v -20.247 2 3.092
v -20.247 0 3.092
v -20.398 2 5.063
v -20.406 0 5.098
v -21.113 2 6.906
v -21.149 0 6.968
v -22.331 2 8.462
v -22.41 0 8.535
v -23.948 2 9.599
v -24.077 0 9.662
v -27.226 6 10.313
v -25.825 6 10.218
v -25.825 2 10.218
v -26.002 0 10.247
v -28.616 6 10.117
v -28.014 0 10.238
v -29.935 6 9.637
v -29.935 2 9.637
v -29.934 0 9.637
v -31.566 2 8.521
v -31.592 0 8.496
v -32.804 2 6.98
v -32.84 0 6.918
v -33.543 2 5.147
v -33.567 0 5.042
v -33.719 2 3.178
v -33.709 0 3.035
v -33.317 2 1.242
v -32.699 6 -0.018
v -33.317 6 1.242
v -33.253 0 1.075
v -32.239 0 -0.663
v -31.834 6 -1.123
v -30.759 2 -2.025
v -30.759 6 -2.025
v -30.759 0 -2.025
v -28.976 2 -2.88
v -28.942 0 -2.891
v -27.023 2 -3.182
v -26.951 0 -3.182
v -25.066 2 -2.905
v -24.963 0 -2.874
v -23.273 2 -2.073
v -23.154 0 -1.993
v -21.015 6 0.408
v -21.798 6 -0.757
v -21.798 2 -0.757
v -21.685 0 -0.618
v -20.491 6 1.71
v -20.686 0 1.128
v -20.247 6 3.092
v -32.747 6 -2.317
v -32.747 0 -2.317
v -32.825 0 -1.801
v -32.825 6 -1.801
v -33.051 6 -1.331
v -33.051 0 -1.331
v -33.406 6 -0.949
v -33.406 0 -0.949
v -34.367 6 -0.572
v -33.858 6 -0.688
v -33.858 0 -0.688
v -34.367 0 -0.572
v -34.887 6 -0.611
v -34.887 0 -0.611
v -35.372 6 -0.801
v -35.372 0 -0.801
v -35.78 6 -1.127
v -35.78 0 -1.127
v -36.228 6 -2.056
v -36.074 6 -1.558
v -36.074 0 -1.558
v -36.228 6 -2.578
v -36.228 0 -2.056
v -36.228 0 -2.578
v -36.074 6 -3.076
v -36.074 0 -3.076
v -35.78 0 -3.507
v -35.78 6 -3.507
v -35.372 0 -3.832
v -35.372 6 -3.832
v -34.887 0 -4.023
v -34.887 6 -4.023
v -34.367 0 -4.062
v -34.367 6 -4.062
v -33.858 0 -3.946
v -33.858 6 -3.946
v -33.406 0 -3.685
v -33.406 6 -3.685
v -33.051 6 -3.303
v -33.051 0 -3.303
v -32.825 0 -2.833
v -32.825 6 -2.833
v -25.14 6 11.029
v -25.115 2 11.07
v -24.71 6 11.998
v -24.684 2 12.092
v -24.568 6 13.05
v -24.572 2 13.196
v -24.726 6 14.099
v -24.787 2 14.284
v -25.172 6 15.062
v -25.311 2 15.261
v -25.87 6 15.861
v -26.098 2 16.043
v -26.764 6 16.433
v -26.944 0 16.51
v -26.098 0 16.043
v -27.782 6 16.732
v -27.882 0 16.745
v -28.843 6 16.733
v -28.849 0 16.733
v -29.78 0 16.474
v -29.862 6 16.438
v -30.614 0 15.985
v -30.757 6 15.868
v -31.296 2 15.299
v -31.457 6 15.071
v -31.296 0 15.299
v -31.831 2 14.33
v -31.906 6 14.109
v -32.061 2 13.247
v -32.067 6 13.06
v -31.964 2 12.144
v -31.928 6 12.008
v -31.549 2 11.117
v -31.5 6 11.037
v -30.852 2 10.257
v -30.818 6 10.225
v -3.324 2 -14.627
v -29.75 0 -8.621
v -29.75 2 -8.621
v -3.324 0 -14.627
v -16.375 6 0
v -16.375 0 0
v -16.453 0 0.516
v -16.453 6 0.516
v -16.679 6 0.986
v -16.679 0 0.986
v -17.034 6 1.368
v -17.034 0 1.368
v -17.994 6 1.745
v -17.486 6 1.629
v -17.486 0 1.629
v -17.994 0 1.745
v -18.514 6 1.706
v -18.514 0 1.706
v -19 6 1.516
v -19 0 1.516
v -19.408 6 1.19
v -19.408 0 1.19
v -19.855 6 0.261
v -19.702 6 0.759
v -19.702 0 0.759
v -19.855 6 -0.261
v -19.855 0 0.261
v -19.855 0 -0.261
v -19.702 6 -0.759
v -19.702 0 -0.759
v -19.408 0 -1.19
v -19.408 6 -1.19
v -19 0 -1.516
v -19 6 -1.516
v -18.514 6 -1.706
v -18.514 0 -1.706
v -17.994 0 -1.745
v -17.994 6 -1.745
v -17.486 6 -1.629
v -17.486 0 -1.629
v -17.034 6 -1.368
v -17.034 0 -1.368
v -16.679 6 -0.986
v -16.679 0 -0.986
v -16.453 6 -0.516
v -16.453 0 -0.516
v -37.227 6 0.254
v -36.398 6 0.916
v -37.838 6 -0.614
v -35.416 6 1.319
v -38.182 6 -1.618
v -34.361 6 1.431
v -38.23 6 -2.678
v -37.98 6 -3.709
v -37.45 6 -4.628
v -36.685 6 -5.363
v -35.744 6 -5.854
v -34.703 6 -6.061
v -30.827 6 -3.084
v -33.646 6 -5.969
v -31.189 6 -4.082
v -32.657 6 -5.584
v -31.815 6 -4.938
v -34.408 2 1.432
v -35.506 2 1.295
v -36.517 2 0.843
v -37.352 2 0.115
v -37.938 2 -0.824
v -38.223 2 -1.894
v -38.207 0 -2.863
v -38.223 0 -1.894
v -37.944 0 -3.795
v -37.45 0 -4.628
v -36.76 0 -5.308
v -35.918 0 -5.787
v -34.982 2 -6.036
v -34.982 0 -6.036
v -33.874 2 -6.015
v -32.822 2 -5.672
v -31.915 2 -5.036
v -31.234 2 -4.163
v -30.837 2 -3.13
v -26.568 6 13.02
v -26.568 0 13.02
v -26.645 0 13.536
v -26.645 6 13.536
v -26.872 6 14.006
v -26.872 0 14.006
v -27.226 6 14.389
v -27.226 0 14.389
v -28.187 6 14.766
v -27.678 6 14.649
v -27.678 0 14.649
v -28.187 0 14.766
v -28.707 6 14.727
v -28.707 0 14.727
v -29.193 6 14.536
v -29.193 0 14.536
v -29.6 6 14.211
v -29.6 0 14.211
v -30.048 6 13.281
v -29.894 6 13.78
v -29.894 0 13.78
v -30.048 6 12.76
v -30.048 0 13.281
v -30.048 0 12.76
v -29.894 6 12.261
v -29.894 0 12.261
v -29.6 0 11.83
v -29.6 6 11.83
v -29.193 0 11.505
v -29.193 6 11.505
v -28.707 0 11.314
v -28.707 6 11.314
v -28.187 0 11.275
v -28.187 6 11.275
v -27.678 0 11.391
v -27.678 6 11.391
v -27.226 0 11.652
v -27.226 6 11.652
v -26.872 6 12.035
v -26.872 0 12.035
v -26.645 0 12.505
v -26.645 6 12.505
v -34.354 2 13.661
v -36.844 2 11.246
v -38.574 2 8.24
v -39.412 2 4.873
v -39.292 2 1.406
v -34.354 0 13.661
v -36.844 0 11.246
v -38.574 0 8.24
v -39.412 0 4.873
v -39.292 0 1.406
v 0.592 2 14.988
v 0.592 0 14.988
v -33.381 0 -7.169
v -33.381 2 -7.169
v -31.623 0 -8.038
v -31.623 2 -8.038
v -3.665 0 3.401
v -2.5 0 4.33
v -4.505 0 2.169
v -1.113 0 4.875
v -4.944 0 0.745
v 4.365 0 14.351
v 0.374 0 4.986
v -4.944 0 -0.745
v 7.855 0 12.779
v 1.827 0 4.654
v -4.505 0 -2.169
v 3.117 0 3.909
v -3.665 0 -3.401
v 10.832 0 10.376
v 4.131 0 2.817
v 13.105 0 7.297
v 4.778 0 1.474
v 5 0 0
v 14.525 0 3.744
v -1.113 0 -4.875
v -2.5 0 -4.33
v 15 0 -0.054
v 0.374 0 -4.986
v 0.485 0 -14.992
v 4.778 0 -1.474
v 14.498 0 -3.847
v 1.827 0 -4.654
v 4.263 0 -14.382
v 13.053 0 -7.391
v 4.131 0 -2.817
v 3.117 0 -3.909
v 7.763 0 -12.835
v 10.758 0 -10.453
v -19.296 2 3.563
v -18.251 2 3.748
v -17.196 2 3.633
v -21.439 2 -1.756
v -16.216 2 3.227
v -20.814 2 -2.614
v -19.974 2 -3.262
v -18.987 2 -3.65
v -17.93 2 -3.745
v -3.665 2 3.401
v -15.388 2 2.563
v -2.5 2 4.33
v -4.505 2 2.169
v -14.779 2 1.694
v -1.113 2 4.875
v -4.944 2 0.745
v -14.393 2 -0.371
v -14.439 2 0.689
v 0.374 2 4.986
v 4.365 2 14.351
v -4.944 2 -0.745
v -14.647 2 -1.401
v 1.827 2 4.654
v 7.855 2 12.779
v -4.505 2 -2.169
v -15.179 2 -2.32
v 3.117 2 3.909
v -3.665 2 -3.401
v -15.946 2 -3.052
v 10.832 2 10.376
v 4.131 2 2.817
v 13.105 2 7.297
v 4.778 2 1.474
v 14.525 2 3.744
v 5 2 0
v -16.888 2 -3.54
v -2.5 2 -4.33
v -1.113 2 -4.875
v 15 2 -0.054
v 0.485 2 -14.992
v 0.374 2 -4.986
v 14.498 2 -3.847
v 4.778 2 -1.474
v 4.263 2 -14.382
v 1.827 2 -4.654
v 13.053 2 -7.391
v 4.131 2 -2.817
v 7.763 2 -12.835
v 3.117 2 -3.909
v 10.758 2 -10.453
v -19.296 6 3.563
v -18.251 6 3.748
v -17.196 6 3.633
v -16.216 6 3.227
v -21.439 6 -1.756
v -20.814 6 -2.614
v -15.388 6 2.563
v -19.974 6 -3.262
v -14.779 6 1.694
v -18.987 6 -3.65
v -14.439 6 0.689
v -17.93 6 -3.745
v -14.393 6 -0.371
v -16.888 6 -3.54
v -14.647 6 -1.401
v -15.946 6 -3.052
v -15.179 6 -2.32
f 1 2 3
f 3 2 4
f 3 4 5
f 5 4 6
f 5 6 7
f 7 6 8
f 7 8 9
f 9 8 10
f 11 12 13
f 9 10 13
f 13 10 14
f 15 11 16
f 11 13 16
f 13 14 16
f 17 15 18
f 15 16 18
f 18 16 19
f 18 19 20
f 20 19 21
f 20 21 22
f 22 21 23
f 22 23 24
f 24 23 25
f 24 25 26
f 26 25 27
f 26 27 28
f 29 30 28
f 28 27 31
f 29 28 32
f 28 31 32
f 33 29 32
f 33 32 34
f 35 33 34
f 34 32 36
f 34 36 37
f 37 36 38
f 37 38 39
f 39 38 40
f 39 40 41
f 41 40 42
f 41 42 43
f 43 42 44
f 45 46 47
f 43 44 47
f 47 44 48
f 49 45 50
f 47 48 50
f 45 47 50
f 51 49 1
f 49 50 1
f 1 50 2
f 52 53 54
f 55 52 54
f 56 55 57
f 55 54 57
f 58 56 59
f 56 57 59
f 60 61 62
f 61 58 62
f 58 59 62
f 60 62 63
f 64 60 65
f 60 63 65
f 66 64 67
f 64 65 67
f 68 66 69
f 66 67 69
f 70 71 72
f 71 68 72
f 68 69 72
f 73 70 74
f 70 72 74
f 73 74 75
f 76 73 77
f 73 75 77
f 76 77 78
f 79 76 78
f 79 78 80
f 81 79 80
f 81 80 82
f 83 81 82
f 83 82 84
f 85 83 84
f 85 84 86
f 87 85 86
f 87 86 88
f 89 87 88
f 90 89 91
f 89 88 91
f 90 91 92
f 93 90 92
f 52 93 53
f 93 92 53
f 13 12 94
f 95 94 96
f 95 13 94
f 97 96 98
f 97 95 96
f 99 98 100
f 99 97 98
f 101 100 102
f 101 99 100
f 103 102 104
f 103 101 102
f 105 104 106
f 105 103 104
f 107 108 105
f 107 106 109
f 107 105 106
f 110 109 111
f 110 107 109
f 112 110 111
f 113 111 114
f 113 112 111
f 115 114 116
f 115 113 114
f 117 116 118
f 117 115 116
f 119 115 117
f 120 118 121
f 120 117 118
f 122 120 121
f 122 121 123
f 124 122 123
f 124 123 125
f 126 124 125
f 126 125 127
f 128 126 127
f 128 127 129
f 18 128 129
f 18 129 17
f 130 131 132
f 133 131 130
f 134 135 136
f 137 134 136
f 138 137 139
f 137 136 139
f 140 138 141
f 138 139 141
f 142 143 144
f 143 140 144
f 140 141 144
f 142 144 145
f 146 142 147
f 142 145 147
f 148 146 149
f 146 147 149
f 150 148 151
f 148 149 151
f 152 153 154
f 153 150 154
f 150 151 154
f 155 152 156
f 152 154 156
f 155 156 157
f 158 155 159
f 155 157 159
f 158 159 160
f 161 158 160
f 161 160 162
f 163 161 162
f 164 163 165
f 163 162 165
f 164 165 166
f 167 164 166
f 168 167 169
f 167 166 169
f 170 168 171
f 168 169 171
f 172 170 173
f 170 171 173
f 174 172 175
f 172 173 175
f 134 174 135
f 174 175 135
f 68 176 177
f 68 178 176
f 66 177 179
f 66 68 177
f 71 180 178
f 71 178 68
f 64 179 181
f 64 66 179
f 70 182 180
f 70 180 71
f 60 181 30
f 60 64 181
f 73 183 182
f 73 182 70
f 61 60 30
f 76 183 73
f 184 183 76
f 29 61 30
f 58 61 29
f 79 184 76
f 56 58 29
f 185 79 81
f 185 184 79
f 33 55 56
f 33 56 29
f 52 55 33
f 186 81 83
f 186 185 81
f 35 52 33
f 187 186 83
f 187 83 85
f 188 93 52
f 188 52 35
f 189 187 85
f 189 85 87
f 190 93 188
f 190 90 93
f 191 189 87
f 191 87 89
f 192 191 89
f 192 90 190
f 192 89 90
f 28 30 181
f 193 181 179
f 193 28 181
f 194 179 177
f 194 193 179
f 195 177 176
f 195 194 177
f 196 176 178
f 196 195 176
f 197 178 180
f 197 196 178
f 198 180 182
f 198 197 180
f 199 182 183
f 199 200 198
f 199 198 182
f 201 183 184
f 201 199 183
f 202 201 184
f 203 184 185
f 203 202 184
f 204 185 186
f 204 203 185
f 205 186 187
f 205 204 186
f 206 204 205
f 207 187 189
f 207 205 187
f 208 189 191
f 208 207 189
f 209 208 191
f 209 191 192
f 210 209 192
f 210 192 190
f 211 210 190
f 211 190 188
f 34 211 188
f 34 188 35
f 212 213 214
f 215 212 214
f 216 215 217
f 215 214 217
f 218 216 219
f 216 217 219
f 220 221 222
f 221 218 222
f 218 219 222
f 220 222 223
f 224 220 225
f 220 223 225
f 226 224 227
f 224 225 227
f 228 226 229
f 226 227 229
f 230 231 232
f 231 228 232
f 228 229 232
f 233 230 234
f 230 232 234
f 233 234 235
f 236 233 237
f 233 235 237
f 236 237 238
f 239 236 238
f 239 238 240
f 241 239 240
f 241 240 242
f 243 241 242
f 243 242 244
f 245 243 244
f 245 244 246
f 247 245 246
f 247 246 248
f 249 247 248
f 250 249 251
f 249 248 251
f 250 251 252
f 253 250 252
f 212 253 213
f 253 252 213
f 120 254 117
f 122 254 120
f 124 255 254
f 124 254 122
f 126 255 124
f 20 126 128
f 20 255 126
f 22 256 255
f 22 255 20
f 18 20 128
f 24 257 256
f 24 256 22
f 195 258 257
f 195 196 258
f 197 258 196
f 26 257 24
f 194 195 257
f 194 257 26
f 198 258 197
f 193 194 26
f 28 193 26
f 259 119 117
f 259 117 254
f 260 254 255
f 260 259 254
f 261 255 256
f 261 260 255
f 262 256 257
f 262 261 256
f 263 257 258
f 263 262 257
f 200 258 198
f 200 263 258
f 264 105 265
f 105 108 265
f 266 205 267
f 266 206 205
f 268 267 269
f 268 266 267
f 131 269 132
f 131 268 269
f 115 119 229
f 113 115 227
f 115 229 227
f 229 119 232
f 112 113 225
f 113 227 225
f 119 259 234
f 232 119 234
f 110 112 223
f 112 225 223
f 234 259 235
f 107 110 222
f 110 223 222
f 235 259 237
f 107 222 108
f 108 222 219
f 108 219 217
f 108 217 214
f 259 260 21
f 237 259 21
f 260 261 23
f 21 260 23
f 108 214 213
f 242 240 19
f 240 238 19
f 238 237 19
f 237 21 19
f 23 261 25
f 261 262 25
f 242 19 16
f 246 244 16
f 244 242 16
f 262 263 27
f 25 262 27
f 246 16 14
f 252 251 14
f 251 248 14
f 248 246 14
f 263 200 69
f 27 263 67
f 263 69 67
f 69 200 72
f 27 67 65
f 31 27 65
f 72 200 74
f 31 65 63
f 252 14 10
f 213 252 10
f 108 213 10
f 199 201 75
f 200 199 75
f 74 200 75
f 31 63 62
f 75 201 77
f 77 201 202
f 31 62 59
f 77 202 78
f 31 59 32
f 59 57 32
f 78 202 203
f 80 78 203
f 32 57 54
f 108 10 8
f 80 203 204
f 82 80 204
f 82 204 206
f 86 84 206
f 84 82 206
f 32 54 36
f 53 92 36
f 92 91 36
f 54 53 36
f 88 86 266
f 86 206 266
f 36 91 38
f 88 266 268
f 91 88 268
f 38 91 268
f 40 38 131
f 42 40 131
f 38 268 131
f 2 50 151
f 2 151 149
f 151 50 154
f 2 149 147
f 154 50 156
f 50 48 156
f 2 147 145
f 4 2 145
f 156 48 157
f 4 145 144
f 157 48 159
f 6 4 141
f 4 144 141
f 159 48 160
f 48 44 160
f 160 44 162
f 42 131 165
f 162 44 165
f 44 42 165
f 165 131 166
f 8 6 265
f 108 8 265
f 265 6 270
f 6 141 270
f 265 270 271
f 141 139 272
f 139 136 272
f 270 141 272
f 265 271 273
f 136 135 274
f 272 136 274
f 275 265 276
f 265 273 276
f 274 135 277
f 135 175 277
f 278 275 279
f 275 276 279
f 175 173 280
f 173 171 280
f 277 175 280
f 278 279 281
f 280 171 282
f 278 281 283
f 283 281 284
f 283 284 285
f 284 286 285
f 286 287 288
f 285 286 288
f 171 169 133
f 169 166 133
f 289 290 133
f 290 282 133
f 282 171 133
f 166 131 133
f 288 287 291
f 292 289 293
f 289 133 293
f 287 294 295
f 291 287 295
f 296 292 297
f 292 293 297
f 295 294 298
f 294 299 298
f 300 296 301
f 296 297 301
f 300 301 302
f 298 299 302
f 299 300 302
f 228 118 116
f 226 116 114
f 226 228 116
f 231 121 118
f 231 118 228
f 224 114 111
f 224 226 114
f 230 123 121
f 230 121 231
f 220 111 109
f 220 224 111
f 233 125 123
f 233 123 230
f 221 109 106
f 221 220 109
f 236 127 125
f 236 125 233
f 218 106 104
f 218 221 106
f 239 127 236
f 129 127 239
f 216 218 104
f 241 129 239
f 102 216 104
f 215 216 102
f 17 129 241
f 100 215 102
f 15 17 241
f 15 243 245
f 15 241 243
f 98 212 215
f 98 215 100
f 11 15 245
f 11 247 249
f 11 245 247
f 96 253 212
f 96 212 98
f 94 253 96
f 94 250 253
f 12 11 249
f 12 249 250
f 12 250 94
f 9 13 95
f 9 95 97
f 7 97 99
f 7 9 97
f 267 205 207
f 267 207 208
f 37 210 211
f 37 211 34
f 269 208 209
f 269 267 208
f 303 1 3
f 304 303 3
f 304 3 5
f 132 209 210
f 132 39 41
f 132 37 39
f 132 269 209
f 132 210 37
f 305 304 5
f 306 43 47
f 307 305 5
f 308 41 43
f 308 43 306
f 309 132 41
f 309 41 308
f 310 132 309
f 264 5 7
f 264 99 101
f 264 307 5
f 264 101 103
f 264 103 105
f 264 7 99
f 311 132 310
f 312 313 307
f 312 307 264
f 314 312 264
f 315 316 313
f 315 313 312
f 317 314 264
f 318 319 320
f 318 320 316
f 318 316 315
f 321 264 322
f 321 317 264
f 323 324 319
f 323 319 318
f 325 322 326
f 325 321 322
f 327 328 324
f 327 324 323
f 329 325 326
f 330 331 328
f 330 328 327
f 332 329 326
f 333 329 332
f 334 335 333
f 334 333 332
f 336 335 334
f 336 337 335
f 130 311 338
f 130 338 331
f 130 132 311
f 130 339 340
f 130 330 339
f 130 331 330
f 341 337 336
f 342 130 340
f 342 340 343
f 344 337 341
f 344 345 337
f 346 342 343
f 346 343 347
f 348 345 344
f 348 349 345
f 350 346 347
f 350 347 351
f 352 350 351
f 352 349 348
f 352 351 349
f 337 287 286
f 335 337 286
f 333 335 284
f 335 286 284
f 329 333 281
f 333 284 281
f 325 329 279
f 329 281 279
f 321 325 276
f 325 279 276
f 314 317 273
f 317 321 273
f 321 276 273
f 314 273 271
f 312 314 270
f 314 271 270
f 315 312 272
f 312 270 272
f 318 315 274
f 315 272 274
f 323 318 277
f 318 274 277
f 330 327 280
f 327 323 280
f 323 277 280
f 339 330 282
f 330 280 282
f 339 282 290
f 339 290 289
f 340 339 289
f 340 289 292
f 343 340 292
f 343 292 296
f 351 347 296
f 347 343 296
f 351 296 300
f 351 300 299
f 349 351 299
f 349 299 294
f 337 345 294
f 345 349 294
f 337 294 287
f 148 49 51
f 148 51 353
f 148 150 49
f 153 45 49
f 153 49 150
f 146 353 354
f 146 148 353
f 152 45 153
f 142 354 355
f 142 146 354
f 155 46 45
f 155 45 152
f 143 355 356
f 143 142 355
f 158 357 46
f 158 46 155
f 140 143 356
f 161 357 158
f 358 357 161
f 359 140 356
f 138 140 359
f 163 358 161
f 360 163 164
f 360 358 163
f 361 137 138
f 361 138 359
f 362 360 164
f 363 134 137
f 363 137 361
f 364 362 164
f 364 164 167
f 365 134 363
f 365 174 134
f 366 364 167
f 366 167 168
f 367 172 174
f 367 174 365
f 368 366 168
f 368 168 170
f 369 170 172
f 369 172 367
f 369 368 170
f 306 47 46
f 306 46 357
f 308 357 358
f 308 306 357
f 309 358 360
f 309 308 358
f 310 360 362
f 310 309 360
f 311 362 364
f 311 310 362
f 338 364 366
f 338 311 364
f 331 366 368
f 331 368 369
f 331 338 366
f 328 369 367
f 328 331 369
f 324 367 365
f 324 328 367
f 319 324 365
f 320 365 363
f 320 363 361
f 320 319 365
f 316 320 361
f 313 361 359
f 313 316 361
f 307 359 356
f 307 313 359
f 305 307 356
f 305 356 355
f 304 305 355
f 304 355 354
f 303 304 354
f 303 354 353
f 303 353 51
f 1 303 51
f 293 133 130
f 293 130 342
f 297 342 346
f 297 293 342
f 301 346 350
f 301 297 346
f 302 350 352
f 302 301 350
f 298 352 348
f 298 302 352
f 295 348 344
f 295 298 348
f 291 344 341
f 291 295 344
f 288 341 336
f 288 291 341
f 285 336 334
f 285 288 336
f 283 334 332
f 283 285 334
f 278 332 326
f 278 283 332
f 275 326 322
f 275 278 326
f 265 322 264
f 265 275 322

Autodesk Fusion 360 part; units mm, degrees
sketch "Sketch1" plane through (0, 0, 0) normal (0, 1, 0) x (1, 0, 0)
  circle A0 centre (0, 0) radius 15
  circle A1 centre (0, 0) radius 5
  circle A2 centre (-26.98, -3.5679) radius 12.5
  circle A3 centre (-26.98, -3.5679) radius 6.75
  line L0 (-15, 0) -> (-21.25, 0) construction
  circle A4 centre (-18.125, 0) radius 1.75
  circle A5 centre (-18.125, 0) radius 3.75
  circle A6 centre (-34.4974, 2.3169) radius 3.75
  circle A7 centre (-34.4974, 2.3169) radius 1.75
  circle A8 centre (-28.3176, -13.0204) radius 3.75
  circle A9 centre (-28.3176, -13.0204) radius 1.75
  line L1 (-26.4865, -16.0581) -> (0.5921, -14.9883)
  line L2 (-35.1738, 7.3887) -> (6.156, 16.7815)
  dimension "d8" = 30
  dimension "d9" = 10
  dimension "d10" = 25
  dimension "d11" = 13.5
  dimension "d13" = 3.5
  dimension "d14" = 2
  dimension "d16" = 360
extrude "Extrude1" add sketch "Sketch1" along normal blind 2 contours A0 A2 A5 | A0 A2 A8 L1 | A0 A2 A3 A5 A8 | A0 A2 A5 | A0 A2 A5 L2 | A2 A3 A6 A8 | A2 A3 A5 A6 picked at (-11.2572, 2.1089) picked at (-14.7409, -2.1959) makes body 1 at (-17.1331, 0, -8.9977) makes body 2 at (-33.5448, 0, 10.0531)
extrude "Extrude2" add sketch "Sketch1" along normal blind 6 contours A2 A8 L1 | A2 A8 L1 | A0 A2 A3 A5 | A0 A2 A5 | A2 A3 A8 | A0 A2 A5 | A0 A2 A5 | A2 A6 | A2 A3 A6 picked at (-14.7886, -1.2173) picked at (-14.7981, 0.3734) picked at (-15.5133, 1.9421) bodies 1 2
equation "ring_hole = 13.5 mm"
equation "ring_diam = 25 mm"
equation "screw_diam = 10 mm"
equation "depth = 2 mm"
equation "screw_od = 30 mm"
equation "insert_depth = 4 mm"
equation "insert_od = 3.5 mm"
equation "d8 = screw_od"
equation "d9 = screw_diam"
equation "d10 = ring_diam"
equation "d11 = ring_hole"
equation "m2_hole = 3 mm"
equation "d13 = insert_od"
equation "d14 = depth"
equation "d17 = depth"
equation "d19 = depth + insert_depth"
